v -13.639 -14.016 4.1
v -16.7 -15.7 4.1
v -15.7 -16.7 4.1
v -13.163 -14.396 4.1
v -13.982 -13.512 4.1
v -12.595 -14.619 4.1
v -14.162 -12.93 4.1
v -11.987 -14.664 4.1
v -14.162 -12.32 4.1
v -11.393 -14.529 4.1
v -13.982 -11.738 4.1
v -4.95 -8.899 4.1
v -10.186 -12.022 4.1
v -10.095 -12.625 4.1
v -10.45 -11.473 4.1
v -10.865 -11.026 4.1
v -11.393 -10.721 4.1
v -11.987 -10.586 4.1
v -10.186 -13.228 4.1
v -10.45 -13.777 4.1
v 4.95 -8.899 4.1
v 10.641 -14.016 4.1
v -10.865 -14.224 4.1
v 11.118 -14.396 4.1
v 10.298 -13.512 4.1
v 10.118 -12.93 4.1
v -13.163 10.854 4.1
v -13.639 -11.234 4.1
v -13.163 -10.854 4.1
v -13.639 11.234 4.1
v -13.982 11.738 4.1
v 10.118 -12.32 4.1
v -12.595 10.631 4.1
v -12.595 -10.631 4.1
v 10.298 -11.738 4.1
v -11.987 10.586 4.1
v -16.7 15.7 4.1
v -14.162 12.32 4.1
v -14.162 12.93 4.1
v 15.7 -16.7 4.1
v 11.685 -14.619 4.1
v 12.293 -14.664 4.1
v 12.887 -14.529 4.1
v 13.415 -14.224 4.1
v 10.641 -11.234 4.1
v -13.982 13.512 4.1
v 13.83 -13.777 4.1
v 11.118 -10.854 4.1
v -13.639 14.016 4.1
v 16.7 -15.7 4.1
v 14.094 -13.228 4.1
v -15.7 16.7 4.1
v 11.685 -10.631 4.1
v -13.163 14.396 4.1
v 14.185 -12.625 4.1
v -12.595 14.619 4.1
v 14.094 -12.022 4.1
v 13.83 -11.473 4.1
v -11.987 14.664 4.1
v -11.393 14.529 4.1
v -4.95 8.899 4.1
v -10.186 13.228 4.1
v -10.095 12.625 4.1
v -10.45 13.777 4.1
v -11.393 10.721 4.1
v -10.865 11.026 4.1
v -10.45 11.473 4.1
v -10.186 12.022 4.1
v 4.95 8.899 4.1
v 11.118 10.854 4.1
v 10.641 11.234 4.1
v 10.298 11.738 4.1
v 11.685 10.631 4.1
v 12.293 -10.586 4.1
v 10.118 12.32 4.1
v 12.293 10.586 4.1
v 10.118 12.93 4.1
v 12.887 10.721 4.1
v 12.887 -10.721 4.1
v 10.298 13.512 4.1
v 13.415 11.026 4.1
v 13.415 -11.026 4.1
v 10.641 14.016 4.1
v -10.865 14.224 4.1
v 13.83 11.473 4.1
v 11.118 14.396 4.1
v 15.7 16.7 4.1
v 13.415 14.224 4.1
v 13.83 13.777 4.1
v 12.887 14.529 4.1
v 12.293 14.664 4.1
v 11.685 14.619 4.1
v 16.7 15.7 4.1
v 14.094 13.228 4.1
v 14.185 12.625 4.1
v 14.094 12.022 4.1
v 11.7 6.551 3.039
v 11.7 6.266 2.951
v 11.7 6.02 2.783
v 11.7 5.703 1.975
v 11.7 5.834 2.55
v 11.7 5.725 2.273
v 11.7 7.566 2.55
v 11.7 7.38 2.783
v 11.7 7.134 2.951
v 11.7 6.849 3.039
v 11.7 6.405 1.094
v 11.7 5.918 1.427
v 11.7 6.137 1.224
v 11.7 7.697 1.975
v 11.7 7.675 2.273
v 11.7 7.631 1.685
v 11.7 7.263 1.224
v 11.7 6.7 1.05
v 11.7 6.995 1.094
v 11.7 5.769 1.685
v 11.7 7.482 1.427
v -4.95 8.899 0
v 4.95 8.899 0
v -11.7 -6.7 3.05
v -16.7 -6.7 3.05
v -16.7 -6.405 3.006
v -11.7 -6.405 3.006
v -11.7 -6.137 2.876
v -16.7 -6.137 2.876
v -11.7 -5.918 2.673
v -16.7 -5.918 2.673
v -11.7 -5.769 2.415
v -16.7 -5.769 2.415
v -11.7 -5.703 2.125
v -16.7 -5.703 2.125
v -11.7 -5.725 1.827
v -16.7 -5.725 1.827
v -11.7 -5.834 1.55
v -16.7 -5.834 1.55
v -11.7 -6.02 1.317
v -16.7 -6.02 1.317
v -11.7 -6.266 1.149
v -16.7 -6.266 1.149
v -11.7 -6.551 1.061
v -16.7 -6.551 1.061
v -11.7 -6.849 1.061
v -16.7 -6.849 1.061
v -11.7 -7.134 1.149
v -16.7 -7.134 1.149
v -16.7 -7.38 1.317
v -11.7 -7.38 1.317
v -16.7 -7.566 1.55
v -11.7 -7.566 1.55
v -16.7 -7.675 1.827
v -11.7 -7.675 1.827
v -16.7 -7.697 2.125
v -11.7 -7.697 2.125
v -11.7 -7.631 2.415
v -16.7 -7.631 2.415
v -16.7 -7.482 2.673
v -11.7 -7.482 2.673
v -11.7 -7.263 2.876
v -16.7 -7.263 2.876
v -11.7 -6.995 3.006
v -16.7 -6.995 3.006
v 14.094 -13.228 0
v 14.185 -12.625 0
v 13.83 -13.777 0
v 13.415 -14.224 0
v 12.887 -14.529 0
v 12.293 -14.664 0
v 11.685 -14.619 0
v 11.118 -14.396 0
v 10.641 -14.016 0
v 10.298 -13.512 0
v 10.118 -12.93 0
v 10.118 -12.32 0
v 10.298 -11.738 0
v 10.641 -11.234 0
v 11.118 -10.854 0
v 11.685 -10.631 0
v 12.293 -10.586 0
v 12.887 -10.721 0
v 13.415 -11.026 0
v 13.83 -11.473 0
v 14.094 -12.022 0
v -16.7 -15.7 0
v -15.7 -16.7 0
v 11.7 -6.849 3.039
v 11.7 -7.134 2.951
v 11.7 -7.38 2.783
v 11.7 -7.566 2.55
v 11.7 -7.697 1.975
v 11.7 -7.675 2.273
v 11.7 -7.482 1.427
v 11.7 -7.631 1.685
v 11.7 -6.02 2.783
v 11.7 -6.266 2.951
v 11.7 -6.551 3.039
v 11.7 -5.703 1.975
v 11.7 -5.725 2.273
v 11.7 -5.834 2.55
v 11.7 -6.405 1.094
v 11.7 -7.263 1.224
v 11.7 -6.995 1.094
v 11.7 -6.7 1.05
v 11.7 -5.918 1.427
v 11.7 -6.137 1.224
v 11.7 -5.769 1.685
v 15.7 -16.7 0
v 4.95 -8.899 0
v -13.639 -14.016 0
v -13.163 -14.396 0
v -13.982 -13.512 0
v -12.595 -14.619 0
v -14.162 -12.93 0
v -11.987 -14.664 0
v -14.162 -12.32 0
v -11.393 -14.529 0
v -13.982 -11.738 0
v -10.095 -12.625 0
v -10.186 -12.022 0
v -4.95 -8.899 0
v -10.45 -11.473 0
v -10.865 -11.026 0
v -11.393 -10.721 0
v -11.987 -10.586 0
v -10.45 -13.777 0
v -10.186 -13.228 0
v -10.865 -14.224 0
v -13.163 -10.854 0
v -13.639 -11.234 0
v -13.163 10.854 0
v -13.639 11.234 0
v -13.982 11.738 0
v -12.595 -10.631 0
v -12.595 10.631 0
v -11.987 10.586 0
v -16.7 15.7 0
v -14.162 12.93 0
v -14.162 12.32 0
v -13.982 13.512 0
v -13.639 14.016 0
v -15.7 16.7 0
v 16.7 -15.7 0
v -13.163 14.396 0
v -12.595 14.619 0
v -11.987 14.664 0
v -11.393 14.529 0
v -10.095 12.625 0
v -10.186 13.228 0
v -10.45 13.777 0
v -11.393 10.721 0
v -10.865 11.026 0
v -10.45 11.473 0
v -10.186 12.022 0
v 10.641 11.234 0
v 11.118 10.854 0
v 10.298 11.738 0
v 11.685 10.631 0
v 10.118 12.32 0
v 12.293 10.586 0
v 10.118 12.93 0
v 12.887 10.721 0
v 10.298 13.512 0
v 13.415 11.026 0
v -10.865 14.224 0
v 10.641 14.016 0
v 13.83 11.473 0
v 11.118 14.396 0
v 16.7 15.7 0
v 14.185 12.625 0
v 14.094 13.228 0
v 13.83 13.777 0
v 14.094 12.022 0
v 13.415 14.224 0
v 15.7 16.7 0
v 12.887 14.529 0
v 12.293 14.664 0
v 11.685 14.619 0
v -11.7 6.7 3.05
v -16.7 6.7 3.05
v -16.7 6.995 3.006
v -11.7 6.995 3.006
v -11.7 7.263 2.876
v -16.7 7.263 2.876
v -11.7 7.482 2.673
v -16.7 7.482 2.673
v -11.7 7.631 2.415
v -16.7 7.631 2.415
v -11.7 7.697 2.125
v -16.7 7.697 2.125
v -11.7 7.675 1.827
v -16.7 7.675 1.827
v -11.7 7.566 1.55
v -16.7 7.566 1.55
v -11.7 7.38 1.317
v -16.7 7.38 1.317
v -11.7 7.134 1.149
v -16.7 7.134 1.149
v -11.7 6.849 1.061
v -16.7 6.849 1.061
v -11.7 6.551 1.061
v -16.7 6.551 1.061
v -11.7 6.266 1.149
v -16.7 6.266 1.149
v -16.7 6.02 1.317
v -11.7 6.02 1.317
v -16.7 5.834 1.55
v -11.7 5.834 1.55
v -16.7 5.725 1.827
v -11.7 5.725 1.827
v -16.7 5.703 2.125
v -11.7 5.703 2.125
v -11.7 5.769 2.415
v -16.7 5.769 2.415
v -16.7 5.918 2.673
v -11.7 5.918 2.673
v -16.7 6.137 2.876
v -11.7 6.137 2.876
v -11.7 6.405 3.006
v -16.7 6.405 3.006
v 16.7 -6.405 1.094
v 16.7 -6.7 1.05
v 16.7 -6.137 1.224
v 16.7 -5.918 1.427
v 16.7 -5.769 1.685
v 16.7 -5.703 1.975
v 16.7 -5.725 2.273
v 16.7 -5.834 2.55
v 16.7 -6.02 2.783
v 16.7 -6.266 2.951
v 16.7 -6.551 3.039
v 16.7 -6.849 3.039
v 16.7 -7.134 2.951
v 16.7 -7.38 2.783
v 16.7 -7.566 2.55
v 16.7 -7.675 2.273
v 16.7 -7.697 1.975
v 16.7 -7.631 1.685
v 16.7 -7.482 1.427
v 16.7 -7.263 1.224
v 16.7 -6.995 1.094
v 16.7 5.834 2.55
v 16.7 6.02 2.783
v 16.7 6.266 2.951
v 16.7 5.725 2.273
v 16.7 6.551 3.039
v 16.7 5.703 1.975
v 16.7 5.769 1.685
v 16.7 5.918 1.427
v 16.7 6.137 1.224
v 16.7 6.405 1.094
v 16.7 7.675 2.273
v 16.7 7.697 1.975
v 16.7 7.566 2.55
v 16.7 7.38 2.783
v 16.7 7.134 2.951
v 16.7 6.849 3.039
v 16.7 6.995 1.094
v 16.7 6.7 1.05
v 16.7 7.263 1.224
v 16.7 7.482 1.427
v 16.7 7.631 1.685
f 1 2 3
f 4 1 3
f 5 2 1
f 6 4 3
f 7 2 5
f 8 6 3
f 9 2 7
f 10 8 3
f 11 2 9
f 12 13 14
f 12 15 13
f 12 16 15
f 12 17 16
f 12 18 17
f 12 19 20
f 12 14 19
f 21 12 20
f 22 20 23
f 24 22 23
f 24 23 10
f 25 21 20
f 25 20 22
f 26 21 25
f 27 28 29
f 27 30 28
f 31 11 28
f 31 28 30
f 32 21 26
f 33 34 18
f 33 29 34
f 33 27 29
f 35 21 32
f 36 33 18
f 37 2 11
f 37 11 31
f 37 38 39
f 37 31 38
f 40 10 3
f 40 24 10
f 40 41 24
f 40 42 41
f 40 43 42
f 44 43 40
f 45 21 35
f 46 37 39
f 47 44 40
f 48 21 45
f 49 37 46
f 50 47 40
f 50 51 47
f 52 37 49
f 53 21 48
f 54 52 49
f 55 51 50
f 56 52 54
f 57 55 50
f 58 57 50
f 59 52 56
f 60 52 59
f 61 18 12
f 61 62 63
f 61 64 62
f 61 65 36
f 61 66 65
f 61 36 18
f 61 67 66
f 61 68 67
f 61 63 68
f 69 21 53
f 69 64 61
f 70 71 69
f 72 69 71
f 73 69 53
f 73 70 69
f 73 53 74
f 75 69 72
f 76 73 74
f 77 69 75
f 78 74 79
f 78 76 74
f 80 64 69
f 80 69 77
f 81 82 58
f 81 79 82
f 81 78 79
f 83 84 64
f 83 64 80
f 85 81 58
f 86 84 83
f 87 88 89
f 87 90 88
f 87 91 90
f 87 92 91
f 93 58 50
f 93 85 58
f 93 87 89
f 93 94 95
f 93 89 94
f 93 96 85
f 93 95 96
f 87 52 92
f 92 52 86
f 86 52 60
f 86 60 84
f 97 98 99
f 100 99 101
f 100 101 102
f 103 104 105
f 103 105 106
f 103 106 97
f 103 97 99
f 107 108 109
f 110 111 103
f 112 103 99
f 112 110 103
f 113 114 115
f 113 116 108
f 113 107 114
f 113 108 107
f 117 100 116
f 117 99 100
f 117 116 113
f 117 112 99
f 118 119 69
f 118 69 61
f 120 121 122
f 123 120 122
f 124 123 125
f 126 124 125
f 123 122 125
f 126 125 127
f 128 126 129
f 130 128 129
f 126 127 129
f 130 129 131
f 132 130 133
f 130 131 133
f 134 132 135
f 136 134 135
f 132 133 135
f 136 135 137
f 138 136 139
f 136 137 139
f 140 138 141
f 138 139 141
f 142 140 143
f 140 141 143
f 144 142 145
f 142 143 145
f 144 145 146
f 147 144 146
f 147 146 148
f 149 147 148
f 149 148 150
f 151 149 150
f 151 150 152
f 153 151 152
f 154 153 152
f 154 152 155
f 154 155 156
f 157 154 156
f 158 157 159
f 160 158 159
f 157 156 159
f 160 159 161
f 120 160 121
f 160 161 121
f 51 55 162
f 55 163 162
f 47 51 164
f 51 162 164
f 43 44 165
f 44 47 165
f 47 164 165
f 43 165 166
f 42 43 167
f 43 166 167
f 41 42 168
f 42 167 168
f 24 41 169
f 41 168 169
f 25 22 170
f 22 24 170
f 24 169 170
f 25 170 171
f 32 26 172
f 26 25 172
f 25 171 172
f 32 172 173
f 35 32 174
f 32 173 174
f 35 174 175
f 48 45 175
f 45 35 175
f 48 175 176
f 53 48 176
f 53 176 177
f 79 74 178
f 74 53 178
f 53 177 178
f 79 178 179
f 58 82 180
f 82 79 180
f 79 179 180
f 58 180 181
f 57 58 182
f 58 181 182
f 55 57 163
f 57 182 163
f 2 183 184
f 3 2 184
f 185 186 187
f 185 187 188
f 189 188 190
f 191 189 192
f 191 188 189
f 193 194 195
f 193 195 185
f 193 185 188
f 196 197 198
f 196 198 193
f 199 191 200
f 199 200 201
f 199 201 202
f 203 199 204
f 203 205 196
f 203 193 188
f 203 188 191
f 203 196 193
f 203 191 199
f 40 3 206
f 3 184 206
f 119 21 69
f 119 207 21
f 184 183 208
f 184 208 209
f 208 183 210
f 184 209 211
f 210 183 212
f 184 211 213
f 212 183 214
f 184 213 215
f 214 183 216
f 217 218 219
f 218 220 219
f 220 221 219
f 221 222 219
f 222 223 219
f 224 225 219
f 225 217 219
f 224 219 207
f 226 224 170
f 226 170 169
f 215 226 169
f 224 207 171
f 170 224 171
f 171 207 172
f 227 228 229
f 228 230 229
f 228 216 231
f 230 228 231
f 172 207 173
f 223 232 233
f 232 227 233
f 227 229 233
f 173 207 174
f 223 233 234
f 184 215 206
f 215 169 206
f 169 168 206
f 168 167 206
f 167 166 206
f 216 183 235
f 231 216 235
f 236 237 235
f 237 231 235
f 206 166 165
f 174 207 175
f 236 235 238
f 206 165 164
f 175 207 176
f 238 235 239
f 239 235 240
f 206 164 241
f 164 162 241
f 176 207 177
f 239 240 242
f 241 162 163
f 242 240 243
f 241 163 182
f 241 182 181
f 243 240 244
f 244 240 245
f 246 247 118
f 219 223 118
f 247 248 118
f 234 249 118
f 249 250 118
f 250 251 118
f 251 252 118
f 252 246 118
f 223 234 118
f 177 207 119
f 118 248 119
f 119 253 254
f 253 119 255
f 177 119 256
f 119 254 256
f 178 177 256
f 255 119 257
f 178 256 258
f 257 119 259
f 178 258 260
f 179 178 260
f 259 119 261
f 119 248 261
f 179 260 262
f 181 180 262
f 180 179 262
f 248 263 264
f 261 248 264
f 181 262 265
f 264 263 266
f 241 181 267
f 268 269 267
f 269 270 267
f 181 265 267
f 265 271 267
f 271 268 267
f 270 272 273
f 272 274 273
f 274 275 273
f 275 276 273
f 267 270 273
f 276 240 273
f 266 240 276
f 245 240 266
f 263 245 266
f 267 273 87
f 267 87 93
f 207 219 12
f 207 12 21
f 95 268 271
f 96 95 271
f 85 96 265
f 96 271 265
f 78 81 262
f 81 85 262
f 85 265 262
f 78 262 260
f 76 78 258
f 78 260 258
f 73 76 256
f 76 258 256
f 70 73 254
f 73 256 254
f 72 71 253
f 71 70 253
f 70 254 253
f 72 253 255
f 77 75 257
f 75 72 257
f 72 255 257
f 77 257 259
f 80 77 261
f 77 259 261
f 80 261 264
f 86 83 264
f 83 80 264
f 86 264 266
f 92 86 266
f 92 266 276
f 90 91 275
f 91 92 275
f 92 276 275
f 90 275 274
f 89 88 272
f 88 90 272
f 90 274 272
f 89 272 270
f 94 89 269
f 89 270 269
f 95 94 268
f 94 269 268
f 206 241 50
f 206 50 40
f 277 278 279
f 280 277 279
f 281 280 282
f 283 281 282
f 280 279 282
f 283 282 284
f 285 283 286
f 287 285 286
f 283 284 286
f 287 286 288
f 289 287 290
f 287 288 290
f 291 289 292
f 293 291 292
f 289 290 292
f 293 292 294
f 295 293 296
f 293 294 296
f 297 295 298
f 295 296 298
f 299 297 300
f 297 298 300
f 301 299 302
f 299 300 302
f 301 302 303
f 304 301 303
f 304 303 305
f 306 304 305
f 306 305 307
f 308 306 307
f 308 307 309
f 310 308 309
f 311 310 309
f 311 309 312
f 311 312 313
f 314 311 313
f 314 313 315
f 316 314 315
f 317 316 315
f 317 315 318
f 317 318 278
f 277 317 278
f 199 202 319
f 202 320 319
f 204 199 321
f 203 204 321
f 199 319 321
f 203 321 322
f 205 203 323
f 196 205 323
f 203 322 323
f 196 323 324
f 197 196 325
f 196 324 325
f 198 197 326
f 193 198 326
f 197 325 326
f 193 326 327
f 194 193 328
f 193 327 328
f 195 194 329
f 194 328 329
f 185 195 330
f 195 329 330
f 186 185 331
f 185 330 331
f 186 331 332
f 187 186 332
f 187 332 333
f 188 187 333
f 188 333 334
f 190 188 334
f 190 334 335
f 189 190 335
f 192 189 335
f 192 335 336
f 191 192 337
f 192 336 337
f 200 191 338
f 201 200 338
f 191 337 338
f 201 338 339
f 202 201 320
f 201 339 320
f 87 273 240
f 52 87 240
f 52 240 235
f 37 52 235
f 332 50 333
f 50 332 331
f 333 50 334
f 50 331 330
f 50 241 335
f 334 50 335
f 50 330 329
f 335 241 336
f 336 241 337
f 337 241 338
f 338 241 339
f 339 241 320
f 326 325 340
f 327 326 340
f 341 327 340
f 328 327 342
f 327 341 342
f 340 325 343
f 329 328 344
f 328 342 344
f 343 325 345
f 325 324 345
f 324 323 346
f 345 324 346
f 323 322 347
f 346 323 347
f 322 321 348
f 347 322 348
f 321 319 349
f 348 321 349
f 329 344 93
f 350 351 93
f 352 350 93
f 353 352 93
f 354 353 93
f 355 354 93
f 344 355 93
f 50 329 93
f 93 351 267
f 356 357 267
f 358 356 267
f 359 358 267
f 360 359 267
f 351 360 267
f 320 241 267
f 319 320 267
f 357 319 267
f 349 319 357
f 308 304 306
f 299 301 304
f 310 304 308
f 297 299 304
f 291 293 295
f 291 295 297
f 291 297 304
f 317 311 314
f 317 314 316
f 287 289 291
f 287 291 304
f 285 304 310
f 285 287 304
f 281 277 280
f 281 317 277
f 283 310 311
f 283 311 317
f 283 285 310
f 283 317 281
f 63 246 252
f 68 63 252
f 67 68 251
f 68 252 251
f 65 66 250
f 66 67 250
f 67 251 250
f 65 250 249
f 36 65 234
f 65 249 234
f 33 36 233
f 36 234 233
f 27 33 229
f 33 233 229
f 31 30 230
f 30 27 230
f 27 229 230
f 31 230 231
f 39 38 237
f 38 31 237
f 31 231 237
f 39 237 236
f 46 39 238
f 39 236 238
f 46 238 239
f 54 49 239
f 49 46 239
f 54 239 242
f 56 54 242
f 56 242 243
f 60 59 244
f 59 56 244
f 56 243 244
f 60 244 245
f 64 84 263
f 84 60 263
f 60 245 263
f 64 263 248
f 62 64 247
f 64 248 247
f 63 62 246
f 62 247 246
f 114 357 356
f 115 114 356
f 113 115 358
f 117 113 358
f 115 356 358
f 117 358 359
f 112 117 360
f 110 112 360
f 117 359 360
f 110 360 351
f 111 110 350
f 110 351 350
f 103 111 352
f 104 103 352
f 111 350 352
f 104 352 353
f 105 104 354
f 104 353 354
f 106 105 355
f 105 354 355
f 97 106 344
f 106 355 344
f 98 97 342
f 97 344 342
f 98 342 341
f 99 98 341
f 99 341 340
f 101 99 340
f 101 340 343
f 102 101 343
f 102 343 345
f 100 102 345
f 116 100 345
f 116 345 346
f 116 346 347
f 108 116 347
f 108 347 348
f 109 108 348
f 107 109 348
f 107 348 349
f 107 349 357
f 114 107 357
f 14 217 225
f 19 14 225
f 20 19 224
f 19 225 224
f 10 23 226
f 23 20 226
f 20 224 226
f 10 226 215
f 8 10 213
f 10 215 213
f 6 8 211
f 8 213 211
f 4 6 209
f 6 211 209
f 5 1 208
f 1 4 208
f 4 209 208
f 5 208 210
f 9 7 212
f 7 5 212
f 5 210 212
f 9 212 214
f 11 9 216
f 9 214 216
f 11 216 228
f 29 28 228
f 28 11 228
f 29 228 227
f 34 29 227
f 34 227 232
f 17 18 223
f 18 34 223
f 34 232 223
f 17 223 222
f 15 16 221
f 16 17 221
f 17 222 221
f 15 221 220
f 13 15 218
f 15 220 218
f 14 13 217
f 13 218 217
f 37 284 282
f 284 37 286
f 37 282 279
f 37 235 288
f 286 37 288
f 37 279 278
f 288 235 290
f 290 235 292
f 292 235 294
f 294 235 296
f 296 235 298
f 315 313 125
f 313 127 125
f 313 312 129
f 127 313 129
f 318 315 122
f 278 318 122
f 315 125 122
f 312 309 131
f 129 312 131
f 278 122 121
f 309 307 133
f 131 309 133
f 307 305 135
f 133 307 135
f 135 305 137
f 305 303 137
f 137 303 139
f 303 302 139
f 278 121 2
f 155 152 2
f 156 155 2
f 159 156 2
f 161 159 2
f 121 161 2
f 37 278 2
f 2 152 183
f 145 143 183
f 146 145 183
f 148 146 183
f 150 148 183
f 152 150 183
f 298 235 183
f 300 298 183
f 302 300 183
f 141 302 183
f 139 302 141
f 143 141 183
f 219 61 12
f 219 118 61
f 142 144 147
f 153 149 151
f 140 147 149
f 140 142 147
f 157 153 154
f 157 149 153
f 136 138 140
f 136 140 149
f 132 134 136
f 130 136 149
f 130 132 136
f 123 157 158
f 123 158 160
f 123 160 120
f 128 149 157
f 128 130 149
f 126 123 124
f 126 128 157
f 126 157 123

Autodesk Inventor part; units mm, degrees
ref_plane "YZ Plane" through (0, 0, 0) normal (1, 0, 0) x (0, 1, 0)
ref_plane "XZ Plane" through (0, 0, 0) normal (0, 1, 0) x (-1, 0, 0)
ref_plane "XY Plane" through (0, 0, 0) normal (0, 0, 1) x (1, 0, 0)
sketch "Sketch3" plane through (0, 0, 0) normal (0, 0, 1) x (1, 0, 0)
  line L0 (-15.7, -16.7) -> (15.7, -16.7)
  line L1 (16.7, -15.7) -> (16.7, 15.7)
  line L2 (15.7, 16.7) -> (-15.7, 16.7)
  line L3 (-16.7, 15.7) -> (-16.7, -15.7)
  line L4 (-16.7, -16.7) -> (16.7, 16.7) construction
  line L5 (16.7, -16.7) -> (-16.7, 16.7) construction
  line L6 (-15.7, 16.7) -> (-16.7, 15.7)
  line L7 (15.7, 16.7) -> (16.7, 15.7)
  line L8 (16.7, -15.7) -> (15.7, -16.7)
  line L9 (-16.7, -15.7) -> (-15.7, -16.7)
  line L10 (-4.9497, -8.8994) -> (4.9497, -8.8994)
  line L11 (4.9497, -8.8994) -> (4.9497, 8.8994)
  line L12 (4.9497, 8.8994) -> (-4.9497, 8.8994)
  line L13 (-4.9497, 8.8994) -> (-4.9497, -8.8994)
  line L14 (-4.9497, -8.8994) -> (4.9497, 8.8994) construction
  line L15 (4.9497, -8.8994) -> (-4.9497, 8.8994) construction
  circle A0 centre (-12.14, 12.625) radius 2.045
  circle A1 centre (12.14, 12.625) radius 2.045
  line L16 (0, -16.7) -> (0, 16.7) construction
  circle A2 centre (-12.14, -12.625) radius 2.045
  circle A3 centre (12.14, -12.625) radius 2.045
  line L17 (12.14, 12.625) -> (-12.14, 12.625) construction
  line L18 (-12.14, 12.625) -> (-12.14, -12.625) construction
  line L19 (-12.14, -12.625) -> (12.14, -12.625) construction
  line L20 (12.14, -12.625) -> (12.14, 12.625) construction
  line L21 (-16.7, 0) -> (16.7, 0) construction
  point P0 (0, 0)
  point P1 (0, 0)
  dimension "d0" = 33.4
  dimension "d1" = 33.4
  dimension "d2" = 1
  dimension "d3" = 1
  dimension "d4" = 1
  dimension "d5" = 1
  dimension "d6" = 1
  dimension "d7" = 1
  dimension "d8" = 1
  dimension "d9" = 1
  dimension "d10" = 9.8994
  dimension "d11" = 17.7988
  dimension "d12" = 4.09
  dimension "d13" = 4.09
  dimension "d17" = 4.09
  dimension "d19" = 24.28
  dimension "d20" = 25.25
  dimension "d21" = 4.09
  dimension "d22" = 12.625
  dimension "d23" = 12.14
extrude "Extrusion1" add sketch "Sketch3" along normal blind 4.1
sketch "Sketch4" plane through (16.7, -15.7, 0) normal (1, 0, 0) x (0, 0, -1)
  circle A0 centre (-2.05, 22.4) radius 1
  circle A1 centre (-2.05, 9) radius 1
  line L0 (0, 32.4) -> (-4.1, 32.4) projected
  line L1 (0, -1) -> (-4.1, -1) projected
  line L2 (0, 0) -> (0, 31.4) projected
  line L3 (-4.1, 31.4) -> (-4.1, 32.4) projected
  point P0 (0, 15.7)
  dimension "d26" = 2
  dimension "d27" = 10
  dimension "d28" = 10
  dimension "d29" = 13.4
  dimension "d30" = 2.05
  dimension "d31" = 2.05
  dimension "d36" = 2
extrude "Extrusion2" cut sketch "Sketch4" against normal blind 5
sketch "Sketch6" plane through (-16.7, -15.7, 0) normal (-1, 0, 0) x (0, 0, 1)
  circle A0 centre (2.05, 22.4) radius 1 projected
  circle A1 centre (2.05, 22.4) radius 1
  circle A2 centre (2.05, 9) radius 1 projected
  circle A3 centre (2.05, 9) radius 1
  point P0 (0, 15.7)
extrude "Extrusion3" cut sketch "Sketch6" against normal blind 5
thread "Thread1" size "M2x0.4" class "6H" standard "ANSI Metric M Profile" full length
thread "Thread2" size "M2x0.4" class "6H" standard "ANSI Metric M Profile" full length
thread "Thread3" size "M2x0.4" class "6H" standard "ANSI Metric M Profile" full length
thread "Thread4" size "M2x0.4" class "6H" standard "ANSI Metric M Profile" full length
equation "\"d3\" = d2"
equation "\"d5\" = d4"
equation "\"d6\" = d4"
equation "\"d7\" = d6"
equation "\"d8\" = d4"
equation "\"d9\" = d8"
properties part number "WG18FLANGEHoled" material "Brass, Soft Yellow"
